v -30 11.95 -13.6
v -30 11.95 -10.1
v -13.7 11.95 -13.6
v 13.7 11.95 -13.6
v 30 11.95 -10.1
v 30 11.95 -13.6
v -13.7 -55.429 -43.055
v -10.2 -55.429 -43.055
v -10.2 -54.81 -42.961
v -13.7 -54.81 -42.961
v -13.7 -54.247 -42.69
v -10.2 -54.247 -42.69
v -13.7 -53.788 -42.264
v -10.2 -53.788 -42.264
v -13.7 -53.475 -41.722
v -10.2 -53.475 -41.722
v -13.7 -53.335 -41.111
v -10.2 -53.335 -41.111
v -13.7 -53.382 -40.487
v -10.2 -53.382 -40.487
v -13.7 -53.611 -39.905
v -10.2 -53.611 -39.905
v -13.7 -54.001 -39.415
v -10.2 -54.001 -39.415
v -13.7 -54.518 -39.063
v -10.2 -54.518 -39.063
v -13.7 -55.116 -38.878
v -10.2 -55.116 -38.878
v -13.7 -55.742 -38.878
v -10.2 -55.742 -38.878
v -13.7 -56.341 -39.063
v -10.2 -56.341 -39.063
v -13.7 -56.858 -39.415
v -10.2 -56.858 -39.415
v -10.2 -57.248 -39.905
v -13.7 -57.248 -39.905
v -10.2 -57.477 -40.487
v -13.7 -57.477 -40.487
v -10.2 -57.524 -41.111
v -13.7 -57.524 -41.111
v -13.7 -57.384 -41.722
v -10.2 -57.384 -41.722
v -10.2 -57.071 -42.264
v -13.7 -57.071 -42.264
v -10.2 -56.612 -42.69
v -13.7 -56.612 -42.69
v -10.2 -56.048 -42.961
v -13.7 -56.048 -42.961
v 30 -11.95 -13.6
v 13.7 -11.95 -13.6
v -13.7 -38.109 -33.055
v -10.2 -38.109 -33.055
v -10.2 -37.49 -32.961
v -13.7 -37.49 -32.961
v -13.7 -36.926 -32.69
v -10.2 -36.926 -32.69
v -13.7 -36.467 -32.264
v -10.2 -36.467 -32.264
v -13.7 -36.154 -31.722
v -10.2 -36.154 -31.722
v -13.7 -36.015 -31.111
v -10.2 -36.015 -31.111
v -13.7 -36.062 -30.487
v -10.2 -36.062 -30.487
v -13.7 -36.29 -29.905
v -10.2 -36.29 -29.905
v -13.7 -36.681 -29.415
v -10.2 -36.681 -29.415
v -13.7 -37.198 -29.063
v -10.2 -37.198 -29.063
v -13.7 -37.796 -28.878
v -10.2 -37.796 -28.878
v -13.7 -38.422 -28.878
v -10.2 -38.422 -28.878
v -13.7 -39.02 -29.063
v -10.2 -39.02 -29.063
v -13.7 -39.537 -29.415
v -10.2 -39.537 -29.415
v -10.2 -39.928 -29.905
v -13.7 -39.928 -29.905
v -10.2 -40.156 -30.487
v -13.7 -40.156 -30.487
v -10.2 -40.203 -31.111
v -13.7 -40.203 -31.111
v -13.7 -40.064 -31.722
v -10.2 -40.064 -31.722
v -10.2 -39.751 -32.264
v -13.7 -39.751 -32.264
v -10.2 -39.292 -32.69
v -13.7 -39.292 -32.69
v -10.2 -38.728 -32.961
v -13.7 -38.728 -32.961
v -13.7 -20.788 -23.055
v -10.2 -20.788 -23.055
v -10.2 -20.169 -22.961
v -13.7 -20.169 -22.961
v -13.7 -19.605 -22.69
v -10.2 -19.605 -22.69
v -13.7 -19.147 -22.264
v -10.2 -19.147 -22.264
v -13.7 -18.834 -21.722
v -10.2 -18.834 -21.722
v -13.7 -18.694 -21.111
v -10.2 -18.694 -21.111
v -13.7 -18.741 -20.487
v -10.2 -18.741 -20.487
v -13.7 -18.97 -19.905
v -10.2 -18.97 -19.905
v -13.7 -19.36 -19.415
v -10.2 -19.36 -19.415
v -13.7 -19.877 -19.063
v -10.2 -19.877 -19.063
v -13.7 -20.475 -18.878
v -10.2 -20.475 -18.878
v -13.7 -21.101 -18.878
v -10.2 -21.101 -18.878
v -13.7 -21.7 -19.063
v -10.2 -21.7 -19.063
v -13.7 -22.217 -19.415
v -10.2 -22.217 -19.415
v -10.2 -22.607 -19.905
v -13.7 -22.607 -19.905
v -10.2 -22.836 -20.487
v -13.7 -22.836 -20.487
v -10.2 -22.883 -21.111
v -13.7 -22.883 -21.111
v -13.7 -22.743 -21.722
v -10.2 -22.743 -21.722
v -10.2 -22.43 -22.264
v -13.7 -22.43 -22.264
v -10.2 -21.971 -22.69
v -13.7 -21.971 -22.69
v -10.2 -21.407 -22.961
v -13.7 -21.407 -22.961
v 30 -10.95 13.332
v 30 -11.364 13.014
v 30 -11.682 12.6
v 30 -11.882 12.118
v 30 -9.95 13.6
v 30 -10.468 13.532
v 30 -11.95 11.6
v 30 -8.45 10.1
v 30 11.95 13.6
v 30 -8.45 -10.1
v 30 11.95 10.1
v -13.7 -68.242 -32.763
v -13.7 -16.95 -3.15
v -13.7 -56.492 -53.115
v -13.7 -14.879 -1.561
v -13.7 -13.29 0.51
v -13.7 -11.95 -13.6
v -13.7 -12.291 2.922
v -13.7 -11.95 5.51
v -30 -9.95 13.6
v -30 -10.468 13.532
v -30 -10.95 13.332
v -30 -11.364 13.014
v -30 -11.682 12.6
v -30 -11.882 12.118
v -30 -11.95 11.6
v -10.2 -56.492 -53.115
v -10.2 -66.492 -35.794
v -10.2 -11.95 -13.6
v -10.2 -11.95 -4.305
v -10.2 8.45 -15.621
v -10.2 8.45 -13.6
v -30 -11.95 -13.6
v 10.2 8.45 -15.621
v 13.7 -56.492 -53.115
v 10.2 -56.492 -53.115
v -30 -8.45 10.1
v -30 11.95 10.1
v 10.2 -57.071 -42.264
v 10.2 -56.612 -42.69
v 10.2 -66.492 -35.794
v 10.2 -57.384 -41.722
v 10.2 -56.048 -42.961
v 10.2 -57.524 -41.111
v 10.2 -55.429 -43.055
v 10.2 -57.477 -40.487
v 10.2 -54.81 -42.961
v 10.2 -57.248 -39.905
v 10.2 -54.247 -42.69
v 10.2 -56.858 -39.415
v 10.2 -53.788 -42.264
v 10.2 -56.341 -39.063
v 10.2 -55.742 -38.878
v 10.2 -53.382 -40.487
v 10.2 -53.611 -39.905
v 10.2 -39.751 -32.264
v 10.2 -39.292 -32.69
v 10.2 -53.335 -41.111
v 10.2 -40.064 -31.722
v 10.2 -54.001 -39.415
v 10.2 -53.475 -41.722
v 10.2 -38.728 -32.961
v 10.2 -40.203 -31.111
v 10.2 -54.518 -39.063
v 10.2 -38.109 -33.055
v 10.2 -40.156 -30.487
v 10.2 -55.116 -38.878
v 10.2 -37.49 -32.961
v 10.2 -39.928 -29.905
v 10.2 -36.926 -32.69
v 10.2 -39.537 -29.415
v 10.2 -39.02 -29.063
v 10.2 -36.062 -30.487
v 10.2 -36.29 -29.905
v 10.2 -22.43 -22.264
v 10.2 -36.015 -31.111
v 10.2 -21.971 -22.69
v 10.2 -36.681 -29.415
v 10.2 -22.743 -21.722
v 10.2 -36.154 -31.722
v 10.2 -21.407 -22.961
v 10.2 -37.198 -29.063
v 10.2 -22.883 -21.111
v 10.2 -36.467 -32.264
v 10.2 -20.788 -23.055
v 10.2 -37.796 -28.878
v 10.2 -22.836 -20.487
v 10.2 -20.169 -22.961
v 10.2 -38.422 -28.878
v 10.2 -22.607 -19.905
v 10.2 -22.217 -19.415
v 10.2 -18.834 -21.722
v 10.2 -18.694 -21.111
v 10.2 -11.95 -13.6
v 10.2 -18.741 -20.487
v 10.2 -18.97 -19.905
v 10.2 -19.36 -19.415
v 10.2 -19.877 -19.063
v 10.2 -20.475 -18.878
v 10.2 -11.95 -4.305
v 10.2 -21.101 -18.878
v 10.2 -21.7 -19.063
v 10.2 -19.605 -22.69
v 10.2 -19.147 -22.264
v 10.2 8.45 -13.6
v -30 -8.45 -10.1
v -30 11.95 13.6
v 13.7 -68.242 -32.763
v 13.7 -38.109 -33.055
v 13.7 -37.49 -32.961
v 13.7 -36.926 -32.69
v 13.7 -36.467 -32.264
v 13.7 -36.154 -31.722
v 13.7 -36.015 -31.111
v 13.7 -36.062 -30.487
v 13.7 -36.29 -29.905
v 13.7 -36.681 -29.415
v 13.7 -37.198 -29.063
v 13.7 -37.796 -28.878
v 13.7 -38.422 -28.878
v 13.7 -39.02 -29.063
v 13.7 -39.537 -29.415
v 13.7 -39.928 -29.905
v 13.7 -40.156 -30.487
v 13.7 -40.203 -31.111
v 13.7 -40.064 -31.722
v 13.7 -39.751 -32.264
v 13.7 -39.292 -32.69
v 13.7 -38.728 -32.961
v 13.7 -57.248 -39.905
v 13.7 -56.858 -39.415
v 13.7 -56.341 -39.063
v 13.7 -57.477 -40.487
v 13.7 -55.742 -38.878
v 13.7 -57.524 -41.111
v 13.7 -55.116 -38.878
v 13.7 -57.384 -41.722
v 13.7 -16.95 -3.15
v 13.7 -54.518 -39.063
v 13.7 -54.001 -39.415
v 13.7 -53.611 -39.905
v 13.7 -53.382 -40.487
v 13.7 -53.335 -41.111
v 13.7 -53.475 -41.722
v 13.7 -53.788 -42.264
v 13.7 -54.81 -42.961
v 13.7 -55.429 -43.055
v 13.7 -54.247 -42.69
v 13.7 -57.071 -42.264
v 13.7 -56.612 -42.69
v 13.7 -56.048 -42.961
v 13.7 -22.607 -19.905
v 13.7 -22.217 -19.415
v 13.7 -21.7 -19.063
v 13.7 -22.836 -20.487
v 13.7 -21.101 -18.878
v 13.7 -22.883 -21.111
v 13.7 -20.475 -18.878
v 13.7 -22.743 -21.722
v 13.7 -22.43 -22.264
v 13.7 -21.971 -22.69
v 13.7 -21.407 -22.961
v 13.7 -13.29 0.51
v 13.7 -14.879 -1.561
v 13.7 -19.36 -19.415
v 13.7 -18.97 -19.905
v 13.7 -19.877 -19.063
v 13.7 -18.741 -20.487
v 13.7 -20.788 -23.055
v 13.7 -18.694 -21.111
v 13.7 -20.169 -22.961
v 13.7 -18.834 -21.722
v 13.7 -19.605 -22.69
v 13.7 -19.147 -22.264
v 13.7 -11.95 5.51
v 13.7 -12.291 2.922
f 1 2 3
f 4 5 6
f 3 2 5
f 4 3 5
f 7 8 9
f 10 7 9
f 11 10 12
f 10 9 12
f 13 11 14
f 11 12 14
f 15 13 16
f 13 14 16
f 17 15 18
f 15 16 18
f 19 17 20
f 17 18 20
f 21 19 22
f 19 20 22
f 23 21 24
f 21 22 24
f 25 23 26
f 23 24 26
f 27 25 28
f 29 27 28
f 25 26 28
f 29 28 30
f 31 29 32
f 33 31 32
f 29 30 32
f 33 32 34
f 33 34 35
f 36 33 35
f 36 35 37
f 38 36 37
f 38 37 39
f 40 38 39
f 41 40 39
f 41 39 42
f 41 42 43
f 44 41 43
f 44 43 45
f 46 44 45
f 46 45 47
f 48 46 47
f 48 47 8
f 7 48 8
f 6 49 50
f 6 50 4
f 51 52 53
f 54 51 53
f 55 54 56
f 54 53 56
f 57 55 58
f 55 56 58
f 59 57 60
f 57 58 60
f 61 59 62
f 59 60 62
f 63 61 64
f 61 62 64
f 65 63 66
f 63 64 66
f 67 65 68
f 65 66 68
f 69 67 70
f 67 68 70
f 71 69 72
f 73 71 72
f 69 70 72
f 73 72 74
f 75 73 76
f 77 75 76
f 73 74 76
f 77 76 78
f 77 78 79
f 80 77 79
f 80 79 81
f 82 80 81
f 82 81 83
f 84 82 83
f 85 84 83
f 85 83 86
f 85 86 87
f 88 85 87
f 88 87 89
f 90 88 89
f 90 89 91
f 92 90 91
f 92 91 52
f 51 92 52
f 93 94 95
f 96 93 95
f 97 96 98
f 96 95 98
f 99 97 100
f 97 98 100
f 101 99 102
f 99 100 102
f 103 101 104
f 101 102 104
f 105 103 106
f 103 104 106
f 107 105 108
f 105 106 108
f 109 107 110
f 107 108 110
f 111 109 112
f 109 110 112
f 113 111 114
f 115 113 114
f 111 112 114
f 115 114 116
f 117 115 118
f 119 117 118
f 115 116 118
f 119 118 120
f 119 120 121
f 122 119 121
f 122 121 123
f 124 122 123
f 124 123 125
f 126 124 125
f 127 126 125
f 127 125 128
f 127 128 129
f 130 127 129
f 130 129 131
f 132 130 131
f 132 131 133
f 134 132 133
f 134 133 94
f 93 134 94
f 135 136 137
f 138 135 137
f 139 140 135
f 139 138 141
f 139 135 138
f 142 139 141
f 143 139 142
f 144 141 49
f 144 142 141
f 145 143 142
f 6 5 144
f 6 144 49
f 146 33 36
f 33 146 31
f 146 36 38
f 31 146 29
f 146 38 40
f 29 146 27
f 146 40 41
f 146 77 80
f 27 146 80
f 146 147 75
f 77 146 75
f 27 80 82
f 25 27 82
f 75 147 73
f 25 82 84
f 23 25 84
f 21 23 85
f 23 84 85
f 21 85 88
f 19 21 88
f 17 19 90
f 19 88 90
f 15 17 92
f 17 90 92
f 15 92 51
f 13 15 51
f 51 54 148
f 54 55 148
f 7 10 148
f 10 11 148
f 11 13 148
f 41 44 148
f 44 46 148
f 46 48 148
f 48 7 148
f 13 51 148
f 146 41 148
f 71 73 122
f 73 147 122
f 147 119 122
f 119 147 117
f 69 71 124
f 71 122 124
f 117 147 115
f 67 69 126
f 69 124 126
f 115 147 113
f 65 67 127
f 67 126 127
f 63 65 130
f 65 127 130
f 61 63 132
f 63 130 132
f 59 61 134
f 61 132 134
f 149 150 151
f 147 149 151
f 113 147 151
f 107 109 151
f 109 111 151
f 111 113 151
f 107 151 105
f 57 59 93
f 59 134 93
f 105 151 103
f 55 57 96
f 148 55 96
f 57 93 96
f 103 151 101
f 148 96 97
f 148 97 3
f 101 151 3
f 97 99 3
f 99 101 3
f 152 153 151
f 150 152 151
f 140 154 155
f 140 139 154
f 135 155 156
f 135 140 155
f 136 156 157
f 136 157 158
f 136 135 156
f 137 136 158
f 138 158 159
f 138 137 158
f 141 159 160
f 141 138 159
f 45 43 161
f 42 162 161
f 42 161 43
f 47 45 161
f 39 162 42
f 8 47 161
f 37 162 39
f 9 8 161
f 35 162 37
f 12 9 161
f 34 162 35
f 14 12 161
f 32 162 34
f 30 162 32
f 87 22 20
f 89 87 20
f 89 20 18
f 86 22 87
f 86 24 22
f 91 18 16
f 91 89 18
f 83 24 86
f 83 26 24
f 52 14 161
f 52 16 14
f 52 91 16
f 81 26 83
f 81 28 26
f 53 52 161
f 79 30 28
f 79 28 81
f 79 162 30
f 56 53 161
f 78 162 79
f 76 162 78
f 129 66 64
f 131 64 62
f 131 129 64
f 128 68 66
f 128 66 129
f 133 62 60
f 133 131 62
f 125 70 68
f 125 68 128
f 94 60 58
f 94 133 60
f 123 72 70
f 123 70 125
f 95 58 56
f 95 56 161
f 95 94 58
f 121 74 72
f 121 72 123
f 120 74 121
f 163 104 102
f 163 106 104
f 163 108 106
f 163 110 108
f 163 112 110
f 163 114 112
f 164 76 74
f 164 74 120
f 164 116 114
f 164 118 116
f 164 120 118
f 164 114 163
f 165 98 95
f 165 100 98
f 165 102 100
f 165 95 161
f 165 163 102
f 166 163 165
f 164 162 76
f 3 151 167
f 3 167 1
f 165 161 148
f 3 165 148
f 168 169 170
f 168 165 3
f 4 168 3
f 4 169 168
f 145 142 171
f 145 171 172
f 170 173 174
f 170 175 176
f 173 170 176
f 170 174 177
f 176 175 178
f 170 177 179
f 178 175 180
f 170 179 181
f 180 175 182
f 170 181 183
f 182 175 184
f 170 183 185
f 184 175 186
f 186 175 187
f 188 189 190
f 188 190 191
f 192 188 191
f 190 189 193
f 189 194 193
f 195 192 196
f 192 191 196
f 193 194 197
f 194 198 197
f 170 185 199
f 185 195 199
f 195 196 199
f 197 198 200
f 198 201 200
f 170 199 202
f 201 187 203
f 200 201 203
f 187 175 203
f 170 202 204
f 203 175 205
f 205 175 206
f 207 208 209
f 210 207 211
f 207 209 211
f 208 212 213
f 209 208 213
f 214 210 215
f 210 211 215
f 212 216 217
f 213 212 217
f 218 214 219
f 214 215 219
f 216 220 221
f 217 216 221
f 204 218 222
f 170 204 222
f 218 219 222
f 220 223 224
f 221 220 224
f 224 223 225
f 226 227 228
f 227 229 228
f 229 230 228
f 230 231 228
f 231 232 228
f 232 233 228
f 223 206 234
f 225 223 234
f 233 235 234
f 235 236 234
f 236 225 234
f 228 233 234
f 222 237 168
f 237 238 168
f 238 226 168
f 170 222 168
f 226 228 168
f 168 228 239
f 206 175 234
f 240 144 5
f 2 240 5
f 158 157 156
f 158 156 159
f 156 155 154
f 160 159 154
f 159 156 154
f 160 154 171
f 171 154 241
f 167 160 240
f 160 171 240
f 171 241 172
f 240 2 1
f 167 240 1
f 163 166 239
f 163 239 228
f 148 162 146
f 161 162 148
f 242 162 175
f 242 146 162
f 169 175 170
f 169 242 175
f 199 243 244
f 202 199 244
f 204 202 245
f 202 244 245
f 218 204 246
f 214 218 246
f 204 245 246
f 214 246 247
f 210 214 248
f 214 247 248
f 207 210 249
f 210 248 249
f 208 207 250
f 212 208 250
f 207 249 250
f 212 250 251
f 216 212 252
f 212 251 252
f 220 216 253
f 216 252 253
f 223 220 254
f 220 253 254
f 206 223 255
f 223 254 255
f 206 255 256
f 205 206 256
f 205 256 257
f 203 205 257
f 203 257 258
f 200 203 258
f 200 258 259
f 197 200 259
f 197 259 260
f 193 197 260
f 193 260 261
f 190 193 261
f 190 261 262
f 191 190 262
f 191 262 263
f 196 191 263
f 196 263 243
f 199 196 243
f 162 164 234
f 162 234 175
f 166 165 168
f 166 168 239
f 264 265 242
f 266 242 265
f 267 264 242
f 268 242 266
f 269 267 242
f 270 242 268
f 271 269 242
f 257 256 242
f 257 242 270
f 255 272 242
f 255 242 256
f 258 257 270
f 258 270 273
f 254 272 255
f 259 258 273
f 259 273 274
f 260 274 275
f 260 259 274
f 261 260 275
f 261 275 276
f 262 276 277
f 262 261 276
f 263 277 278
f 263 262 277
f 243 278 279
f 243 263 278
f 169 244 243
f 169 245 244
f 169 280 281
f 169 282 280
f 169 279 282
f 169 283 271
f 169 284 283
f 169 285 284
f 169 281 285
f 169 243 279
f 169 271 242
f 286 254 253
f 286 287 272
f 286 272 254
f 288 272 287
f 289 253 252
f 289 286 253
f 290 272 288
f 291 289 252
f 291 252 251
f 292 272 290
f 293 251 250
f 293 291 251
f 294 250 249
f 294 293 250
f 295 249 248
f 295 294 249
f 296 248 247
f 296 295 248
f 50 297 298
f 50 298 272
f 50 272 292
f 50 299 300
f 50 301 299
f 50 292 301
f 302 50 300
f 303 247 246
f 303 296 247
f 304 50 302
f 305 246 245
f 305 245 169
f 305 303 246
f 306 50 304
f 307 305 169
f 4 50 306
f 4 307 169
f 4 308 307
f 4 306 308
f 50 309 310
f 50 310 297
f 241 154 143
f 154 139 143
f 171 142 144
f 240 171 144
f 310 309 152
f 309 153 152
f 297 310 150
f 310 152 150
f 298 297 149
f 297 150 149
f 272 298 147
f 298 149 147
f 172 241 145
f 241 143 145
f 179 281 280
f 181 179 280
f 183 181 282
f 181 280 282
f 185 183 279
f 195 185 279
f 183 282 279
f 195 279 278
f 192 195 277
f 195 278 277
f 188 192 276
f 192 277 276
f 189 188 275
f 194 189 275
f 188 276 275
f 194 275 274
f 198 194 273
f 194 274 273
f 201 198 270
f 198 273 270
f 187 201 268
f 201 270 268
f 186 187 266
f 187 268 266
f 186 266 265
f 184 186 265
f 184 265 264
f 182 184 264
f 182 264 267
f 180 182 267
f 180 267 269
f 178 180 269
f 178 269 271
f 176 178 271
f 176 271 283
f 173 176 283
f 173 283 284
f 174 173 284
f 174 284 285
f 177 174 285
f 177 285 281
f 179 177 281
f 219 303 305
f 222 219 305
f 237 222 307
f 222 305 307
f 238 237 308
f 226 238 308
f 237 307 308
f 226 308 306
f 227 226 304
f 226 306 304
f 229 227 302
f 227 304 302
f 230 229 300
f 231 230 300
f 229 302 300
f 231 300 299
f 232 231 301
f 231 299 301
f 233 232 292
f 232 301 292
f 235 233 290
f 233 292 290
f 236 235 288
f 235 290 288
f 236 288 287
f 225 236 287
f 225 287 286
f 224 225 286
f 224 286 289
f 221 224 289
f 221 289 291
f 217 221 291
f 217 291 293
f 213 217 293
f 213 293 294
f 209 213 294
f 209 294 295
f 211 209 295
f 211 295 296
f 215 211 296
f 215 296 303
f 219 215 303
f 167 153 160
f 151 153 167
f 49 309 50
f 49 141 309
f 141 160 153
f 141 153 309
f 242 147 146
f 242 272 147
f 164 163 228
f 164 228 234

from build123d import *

# Parameters (mm, degrees)
SKETCH1_W           = 27.2
SKETCH1_H           = 23.9
BOSS_EXTRUDE1_DEPTH = 30
SHELL1_T            = -3.5
BOSS_EXTRUDE2_DEPTH = 13.7
SHELL3_START        = -10.2
SHELL3_DEPTH        = 20.4
FILLET2_R           = 2
SKETCH3_R           = 2.1
CUT_EXTRUDE1_DEPTH  = 97.890637096
FILLET3_R           = 10


# Read off the part's stored shape, not the designer's step: Shell3
with BuildPart() as part:
    # Sketch1 → Boss-Extrude1 (new, symmetric)
    with BuildSketch(Plane(origin=(0, 0, 0), x_dir=(0, 0, -1), z_dir=(1, 0, 0))):
        Rectangle(SKETCH1_W, SKETCH1_H)
    extrude(amount=BOSS_EXTRUDE1_DEPTH, both=True)

    # Shell1
    shell1_openings = [part.faces().sort_by_distance(p)[0] for p in [
        (30, 0, 0),
        (-30, 0, 0),
        (0, 11.95, 0),
    ]]
    offset(amount=SHELL1_T, openings=shell1_openings, kind=Kind.INTERSECTION)

    # Sketch2 → Boss-Extrude2 (add, symmetric)
    with BuildSketch(Plane(origin=(0, 0, 0), x_dir=(0, 0, -1), z_dir=(1, 0, 0))):
        Polygon((0.263208782, -11.95), (32.763208782, -68.241651246), (53.114805771, -56.491651246), (13.6, 11.95), (13.6, -11.95), align=None)
    extrude(amount=BOSS_EXTRUDE2_DEPTH, both=True)

    # Shell3 outline → Shell3 (cut)
    with BuildSketch(Plane.YZ.offset(SHELL3_START)):
        Polygon((8.45, -15.620725942), (8.45, -13.6), (-11.95, -13.6), (-11.95, -4.304660666), (-66.491651246, -35.794297695), (-56.491651246, -53.114805771), align=None)
    extrude(amount=SHELL3_DEPTH, mode=Mode.SUBTRACT)

    # Fillet2
    fillet2_edges = [part.edges().sort_by_distance(p)[0] for p in [
        (0, -11.95, 13.6),
    ]]
    fillet(fillet2_edges, radius=FILLET2_R)

    # Sketch3 → Cut-Extrude1 (cut, through all)
    with BuildSketch(Plane(origin=(13.7, 0, 0), x_dir=(0, 0, -1), z_dir=(1, 0, 0))):
        with Locations((40.954551733, -55.429473419)):
            Circle(SKETCH3_R)
        with Locations((30.954551733, -38.108965344)):
            Circle(SKETCH3_R)
        with Locations((20.954551733, -20.788457268)):
            Circle(SKETCH3_R)
    extrude(amount=-CUT_EXTRUDE1_DEPTH, mode=Mode.SUBTRACT)

    # Fillet3
    fillet3_edges = [part.edges().sort_by_distance(p)[0] for p in [
        (0, -11.95, -0.263208782),
    ]]
    fillet(fillet3_edges, radius=FILLET3_R)


solid = part.part
